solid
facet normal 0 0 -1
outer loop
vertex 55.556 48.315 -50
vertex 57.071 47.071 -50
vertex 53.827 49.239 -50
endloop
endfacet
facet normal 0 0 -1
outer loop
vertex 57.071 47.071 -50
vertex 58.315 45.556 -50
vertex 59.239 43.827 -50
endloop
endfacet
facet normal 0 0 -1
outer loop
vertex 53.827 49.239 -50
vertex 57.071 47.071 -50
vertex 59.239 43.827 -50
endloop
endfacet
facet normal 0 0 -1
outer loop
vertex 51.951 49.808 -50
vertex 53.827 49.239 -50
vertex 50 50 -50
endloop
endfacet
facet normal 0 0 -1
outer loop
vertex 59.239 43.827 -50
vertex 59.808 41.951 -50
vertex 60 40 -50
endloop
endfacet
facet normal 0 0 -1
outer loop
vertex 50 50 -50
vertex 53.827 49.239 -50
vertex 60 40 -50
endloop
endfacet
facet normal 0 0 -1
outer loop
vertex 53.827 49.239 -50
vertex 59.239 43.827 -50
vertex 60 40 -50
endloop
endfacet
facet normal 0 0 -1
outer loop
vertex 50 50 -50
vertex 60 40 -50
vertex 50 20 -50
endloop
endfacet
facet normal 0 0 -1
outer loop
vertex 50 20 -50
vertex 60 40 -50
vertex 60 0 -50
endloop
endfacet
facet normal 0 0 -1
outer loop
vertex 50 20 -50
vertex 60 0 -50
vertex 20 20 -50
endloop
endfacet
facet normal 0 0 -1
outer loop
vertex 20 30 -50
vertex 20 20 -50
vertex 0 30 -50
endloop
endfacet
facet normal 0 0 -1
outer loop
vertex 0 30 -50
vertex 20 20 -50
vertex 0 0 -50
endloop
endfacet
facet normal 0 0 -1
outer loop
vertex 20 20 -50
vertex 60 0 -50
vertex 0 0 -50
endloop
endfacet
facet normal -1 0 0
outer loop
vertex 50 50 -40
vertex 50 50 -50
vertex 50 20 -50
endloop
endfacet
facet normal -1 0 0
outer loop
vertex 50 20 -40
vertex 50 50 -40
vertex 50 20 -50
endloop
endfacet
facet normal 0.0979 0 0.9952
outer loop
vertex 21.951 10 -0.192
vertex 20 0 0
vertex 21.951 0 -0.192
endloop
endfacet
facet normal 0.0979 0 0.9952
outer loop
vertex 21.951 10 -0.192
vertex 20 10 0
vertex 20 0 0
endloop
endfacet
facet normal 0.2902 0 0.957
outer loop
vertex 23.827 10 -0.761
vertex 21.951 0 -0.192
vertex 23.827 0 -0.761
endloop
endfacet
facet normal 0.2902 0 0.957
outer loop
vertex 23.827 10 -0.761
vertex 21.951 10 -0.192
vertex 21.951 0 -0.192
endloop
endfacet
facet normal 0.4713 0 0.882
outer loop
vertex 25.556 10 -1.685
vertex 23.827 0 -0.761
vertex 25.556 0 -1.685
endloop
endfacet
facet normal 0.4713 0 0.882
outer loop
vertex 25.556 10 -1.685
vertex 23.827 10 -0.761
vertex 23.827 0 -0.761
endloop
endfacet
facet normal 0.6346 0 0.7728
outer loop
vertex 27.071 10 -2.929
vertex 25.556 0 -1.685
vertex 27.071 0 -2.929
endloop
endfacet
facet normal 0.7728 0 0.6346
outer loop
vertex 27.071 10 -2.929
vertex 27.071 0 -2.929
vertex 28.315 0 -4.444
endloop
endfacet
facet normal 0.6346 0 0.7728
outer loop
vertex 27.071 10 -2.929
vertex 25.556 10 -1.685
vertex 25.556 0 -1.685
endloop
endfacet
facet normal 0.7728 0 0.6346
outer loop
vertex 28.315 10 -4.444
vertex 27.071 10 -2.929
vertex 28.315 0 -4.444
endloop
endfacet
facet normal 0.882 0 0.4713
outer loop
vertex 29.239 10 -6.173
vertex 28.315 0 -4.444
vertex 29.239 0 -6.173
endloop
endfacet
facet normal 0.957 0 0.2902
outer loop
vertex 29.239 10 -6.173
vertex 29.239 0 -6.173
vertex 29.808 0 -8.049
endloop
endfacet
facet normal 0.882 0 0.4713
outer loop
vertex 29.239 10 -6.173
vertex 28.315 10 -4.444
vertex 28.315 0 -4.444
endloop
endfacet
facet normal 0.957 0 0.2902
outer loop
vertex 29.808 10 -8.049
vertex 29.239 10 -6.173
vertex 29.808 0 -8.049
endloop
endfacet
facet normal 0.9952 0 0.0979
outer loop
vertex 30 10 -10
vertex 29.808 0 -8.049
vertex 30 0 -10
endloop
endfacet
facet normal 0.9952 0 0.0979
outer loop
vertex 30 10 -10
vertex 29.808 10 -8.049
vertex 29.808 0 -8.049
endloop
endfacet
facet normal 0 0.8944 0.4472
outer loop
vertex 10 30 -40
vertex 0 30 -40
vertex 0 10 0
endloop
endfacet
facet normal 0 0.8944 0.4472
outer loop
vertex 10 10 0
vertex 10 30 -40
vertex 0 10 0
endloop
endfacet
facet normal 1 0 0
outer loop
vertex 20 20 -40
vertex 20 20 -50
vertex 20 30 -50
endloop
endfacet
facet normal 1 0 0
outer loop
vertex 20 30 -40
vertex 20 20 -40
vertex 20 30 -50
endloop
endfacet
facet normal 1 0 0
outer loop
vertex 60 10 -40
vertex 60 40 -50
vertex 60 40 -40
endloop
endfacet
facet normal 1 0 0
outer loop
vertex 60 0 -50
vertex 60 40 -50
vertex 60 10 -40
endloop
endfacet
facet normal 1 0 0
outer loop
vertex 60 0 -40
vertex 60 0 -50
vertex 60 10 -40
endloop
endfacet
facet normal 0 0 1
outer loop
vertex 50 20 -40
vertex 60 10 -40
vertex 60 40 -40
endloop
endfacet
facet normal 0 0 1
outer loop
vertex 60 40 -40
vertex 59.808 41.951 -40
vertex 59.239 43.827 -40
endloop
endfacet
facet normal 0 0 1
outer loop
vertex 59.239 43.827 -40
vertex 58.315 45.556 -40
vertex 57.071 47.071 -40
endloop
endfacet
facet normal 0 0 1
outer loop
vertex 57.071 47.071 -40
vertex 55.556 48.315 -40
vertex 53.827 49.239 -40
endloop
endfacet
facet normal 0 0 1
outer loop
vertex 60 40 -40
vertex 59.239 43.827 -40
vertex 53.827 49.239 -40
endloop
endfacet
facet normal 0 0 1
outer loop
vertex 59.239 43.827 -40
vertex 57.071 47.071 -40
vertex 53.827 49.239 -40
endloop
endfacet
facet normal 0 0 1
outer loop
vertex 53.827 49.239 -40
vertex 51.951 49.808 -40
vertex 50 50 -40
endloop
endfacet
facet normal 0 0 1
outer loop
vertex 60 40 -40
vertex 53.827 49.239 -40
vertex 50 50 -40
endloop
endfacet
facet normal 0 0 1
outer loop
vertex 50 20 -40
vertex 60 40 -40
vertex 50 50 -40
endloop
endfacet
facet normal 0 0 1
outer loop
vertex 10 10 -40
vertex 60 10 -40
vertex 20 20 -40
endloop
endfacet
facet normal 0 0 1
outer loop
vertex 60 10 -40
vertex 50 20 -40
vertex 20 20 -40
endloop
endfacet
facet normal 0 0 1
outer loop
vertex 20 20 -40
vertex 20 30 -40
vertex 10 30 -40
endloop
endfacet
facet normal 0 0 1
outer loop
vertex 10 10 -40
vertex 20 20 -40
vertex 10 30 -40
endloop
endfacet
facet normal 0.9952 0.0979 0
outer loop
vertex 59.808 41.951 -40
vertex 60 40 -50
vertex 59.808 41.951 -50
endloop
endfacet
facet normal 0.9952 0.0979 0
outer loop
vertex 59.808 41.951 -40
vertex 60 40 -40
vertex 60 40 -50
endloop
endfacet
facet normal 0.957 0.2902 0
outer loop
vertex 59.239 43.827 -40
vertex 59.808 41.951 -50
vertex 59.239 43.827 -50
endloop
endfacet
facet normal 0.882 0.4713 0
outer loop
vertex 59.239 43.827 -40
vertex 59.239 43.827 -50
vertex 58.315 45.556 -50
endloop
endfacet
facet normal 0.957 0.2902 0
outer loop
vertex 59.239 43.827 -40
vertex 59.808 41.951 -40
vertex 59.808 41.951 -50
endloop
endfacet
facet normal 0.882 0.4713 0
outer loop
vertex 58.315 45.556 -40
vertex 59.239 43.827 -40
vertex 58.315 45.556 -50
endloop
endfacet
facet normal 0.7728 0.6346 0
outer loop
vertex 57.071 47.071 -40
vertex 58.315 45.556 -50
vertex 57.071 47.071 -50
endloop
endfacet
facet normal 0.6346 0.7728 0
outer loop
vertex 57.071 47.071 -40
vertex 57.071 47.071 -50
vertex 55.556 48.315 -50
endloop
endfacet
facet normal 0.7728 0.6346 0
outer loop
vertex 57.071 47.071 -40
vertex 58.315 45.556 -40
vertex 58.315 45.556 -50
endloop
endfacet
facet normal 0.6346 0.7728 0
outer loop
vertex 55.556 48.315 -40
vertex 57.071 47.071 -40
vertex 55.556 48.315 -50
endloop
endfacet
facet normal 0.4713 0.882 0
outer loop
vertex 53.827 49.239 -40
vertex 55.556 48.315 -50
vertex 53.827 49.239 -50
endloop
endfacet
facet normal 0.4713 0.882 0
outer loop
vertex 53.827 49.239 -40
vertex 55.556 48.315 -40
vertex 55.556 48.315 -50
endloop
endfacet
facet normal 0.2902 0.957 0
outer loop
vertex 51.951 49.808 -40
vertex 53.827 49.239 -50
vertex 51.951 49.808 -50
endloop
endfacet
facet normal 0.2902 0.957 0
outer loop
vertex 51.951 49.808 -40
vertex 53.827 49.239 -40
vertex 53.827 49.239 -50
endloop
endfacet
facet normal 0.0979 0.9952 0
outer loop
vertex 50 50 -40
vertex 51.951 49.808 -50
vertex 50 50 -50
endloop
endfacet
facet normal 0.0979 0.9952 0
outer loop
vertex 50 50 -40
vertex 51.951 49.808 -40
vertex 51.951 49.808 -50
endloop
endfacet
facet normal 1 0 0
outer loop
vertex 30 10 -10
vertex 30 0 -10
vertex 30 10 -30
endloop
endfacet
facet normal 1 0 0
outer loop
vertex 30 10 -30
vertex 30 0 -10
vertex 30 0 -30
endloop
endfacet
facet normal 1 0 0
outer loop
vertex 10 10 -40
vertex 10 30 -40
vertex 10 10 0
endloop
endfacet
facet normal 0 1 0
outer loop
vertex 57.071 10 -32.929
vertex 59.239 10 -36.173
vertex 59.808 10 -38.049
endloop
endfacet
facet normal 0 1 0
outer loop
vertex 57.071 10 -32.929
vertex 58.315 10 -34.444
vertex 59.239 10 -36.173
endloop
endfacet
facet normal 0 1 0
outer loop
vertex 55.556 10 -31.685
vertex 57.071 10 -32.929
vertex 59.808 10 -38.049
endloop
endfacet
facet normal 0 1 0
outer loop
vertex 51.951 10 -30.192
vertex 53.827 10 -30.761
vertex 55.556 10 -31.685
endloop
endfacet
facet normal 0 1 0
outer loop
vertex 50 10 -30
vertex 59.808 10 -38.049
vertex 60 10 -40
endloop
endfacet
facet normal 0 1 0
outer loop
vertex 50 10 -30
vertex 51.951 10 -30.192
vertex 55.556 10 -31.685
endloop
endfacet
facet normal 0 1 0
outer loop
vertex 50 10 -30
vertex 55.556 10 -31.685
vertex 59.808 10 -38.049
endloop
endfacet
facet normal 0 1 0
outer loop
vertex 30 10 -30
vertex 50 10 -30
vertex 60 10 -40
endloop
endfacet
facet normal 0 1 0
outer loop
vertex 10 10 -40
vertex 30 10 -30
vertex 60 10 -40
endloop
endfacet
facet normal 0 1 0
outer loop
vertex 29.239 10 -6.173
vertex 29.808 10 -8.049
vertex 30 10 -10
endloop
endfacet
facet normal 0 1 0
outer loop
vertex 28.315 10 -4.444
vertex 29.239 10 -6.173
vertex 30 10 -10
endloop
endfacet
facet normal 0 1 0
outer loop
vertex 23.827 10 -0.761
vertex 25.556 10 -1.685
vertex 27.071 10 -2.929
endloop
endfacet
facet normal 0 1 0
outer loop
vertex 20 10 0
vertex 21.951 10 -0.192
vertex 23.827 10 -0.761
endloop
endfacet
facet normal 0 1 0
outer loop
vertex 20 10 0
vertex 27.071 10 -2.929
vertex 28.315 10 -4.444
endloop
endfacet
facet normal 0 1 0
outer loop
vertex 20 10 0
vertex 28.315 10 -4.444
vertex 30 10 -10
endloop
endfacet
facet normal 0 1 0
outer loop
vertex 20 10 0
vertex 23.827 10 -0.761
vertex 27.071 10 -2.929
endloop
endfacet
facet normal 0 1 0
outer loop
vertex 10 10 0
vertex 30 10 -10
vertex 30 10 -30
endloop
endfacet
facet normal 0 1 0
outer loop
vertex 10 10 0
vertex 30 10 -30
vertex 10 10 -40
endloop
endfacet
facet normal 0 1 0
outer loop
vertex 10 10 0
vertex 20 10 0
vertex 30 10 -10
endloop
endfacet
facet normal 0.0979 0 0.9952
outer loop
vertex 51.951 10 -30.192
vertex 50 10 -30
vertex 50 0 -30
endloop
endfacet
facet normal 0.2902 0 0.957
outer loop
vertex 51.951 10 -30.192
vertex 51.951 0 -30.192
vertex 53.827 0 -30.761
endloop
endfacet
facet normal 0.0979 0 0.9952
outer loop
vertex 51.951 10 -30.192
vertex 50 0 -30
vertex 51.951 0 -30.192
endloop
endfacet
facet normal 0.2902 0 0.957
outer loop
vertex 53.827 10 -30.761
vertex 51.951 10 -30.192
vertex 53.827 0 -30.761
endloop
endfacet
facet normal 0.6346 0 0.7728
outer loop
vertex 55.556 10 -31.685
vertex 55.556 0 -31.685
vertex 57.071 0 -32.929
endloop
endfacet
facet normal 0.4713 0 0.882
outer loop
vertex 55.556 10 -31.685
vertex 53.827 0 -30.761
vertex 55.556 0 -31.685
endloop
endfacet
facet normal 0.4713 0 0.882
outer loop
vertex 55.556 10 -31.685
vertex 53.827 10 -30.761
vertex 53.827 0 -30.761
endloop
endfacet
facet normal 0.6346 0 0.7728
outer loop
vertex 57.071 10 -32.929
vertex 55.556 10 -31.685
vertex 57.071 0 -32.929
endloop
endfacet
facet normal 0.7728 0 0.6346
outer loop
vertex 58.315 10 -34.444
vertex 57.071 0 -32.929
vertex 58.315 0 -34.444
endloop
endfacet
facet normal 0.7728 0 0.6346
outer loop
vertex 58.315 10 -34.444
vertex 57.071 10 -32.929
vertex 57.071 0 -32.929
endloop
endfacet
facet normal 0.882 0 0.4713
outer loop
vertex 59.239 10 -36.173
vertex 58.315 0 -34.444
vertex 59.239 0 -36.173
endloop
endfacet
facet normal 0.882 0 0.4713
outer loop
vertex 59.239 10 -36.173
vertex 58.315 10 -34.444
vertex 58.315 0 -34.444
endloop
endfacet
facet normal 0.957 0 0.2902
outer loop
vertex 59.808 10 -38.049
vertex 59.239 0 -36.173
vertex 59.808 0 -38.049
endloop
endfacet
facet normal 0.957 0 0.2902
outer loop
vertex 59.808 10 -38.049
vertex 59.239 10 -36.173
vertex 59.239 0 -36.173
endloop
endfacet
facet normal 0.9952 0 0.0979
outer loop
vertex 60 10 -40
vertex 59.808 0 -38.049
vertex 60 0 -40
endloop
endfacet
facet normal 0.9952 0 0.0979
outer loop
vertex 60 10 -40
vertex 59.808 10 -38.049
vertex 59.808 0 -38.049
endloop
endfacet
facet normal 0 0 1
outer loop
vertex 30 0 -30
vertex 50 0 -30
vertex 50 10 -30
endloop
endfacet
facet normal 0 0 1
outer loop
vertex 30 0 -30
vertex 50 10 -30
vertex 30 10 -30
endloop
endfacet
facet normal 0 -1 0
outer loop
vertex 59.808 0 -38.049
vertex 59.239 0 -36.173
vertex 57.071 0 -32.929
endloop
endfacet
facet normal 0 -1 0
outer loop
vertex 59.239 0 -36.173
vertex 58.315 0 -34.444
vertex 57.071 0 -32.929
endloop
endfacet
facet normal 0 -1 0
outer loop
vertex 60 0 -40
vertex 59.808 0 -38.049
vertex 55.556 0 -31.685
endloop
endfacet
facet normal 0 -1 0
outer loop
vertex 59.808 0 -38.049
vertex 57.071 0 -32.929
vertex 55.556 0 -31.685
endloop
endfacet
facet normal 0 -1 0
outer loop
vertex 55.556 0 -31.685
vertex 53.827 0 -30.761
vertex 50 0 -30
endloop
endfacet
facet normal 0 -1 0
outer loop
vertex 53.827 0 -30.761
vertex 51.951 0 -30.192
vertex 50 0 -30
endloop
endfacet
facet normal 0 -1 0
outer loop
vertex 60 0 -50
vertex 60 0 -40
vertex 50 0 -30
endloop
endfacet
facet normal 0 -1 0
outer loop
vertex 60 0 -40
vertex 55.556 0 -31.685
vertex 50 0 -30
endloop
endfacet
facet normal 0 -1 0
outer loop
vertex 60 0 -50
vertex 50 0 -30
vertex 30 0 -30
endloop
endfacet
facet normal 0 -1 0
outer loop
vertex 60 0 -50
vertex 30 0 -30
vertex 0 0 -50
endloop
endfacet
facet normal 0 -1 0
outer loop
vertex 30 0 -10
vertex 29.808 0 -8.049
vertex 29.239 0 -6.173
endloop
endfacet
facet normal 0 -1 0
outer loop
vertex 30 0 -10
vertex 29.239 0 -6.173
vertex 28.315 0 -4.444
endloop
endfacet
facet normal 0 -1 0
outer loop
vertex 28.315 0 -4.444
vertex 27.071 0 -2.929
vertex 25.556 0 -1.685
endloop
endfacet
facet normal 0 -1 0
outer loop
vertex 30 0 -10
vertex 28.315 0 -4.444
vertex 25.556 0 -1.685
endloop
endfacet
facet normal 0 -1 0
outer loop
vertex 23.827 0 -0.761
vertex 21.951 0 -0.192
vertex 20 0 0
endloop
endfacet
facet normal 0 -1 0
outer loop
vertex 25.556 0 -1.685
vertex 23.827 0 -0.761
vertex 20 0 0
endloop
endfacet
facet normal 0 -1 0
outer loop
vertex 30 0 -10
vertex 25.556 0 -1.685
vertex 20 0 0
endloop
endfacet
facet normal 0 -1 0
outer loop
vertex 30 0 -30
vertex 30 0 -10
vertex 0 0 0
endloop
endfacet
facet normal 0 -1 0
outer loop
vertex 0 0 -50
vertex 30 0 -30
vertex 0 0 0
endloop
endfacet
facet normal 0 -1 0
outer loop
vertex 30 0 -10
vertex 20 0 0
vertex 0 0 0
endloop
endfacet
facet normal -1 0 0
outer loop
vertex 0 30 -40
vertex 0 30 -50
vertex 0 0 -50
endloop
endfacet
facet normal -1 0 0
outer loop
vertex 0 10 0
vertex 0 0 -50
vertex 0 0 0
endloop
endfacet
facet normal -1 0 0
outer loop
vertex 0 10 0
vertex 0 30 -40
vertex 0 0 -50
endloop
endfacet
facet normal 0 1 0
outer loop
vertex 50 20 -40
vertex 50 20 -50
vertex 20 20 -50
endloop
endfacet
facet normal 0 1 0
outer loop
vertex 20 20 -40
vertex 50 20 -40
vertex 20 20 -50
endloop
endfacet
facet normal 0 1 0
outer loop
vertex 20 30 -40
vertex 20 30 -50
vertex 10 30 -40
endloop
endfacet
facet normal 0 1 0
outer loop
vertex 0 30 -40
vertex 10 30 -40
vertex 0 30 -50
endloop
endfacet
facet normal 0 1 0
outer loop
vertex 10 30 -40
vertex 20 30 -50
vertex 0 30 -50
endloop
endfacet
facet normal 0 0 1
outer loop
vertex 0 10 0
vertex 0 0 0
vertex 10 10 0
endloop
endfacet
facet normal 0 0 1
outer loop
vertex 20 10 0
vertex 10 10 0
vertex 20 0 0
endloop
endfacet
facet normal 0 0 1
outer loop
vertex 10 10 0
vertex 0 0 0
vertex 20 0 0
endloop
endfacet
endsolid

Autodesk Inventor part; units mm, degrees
ref_plane "YZ Plane" through (0, 0, 0) normal (1, 0, 0) x (0, 1, 0)
ref_plane "XZ Plane" through (0, 0, 0) normal (0, 1, 0) x (-1, 0, 0)
ref_plane "XY Plane" through (0, 0, 0) normal (0, 0, 1) x (1, 0, 0)
sketch "草圖1" plane through (0, 0, 0) normal (0, 1, 0) x (-1, 0, 0)
  line L0 (0, 0) -> (-30, 0)
  line L1 (-30, 0) -> (-30, -50)
  line L2 (-30, -50) -> (0, -50)
  line L3 (0, -50) -> (0, 0)
  line L4 (-30, -50) -> (-60, -50)
  line L5 (-60, -50) -> (-60, -30)
  line L6 (-60, -30) -> (-30, -30)
  line L7 (-30, -30) -> (-30, -50)
  dimension "d0" = 30
  dimension "d1" = 20
  dimension "d2" = 30
  dimension "d6" = 30
extrude "擠出1" add sketch "草圖1" along normal blind 10
sketch "草圖2" plane through (60, 0, -50) normal (0, 0, -1) x (-1, 0, 0)
  line L0 (60, 0) -> (60, 10) projected
  line L1 (60, 10) -> (40, 10)
  line L2 (40, 10) -> (40, 30)
  line L3 (40, 30) -> (60, 30)
  line L4 (60, 30) -> (60, 10)
  line L5 (40, 10) -> (10, 10)
  line L6 (10, 10) -> (10, 20)
  line L7 (10, 20) -> (40, 20)
  line L8 (40, 20) -> (40, 10)
  line L9 (10, 10) -> (0, 10)
  line L10 (0, 10) -> (0, 50)
  line L11 (0, 50) -> (10, 50)
  line L12 (10, 50) -> (10, 10)
  dimension "d7" = 10
  dimension "d8" = 30
  dimension "d9" = 20
  dimension "d10" = 20
  dimension "d11" = 10
  dimension "d12" = 40
extrude "擠出2" add sketch "草圖2" against normal blind 10
sketch "草圖3" plane through (0, 0, -50) normal (-1, 0, 0) x (0, 0, 1)
  line L0 (0, 30) -> (10, 30) projected
  line L1 (50, 10) -> (20, 10) projected
  line L2 (10, 30) -> (50, 10)
  line L3 (50, 10) -> (10, 10)
  line L4 (10, 20) -> (10, 30) projected
  line L5 (10, 10) -> (10, 30)
  point P0 (50, 0)
extrude "擠出3" add sketch "草圖3" against normal blind 10
fillet "圓角1" radius 10 3 edges at (60, 50, -45) (60, 5, -30) (30, 5, 0)
properties part number "5"
